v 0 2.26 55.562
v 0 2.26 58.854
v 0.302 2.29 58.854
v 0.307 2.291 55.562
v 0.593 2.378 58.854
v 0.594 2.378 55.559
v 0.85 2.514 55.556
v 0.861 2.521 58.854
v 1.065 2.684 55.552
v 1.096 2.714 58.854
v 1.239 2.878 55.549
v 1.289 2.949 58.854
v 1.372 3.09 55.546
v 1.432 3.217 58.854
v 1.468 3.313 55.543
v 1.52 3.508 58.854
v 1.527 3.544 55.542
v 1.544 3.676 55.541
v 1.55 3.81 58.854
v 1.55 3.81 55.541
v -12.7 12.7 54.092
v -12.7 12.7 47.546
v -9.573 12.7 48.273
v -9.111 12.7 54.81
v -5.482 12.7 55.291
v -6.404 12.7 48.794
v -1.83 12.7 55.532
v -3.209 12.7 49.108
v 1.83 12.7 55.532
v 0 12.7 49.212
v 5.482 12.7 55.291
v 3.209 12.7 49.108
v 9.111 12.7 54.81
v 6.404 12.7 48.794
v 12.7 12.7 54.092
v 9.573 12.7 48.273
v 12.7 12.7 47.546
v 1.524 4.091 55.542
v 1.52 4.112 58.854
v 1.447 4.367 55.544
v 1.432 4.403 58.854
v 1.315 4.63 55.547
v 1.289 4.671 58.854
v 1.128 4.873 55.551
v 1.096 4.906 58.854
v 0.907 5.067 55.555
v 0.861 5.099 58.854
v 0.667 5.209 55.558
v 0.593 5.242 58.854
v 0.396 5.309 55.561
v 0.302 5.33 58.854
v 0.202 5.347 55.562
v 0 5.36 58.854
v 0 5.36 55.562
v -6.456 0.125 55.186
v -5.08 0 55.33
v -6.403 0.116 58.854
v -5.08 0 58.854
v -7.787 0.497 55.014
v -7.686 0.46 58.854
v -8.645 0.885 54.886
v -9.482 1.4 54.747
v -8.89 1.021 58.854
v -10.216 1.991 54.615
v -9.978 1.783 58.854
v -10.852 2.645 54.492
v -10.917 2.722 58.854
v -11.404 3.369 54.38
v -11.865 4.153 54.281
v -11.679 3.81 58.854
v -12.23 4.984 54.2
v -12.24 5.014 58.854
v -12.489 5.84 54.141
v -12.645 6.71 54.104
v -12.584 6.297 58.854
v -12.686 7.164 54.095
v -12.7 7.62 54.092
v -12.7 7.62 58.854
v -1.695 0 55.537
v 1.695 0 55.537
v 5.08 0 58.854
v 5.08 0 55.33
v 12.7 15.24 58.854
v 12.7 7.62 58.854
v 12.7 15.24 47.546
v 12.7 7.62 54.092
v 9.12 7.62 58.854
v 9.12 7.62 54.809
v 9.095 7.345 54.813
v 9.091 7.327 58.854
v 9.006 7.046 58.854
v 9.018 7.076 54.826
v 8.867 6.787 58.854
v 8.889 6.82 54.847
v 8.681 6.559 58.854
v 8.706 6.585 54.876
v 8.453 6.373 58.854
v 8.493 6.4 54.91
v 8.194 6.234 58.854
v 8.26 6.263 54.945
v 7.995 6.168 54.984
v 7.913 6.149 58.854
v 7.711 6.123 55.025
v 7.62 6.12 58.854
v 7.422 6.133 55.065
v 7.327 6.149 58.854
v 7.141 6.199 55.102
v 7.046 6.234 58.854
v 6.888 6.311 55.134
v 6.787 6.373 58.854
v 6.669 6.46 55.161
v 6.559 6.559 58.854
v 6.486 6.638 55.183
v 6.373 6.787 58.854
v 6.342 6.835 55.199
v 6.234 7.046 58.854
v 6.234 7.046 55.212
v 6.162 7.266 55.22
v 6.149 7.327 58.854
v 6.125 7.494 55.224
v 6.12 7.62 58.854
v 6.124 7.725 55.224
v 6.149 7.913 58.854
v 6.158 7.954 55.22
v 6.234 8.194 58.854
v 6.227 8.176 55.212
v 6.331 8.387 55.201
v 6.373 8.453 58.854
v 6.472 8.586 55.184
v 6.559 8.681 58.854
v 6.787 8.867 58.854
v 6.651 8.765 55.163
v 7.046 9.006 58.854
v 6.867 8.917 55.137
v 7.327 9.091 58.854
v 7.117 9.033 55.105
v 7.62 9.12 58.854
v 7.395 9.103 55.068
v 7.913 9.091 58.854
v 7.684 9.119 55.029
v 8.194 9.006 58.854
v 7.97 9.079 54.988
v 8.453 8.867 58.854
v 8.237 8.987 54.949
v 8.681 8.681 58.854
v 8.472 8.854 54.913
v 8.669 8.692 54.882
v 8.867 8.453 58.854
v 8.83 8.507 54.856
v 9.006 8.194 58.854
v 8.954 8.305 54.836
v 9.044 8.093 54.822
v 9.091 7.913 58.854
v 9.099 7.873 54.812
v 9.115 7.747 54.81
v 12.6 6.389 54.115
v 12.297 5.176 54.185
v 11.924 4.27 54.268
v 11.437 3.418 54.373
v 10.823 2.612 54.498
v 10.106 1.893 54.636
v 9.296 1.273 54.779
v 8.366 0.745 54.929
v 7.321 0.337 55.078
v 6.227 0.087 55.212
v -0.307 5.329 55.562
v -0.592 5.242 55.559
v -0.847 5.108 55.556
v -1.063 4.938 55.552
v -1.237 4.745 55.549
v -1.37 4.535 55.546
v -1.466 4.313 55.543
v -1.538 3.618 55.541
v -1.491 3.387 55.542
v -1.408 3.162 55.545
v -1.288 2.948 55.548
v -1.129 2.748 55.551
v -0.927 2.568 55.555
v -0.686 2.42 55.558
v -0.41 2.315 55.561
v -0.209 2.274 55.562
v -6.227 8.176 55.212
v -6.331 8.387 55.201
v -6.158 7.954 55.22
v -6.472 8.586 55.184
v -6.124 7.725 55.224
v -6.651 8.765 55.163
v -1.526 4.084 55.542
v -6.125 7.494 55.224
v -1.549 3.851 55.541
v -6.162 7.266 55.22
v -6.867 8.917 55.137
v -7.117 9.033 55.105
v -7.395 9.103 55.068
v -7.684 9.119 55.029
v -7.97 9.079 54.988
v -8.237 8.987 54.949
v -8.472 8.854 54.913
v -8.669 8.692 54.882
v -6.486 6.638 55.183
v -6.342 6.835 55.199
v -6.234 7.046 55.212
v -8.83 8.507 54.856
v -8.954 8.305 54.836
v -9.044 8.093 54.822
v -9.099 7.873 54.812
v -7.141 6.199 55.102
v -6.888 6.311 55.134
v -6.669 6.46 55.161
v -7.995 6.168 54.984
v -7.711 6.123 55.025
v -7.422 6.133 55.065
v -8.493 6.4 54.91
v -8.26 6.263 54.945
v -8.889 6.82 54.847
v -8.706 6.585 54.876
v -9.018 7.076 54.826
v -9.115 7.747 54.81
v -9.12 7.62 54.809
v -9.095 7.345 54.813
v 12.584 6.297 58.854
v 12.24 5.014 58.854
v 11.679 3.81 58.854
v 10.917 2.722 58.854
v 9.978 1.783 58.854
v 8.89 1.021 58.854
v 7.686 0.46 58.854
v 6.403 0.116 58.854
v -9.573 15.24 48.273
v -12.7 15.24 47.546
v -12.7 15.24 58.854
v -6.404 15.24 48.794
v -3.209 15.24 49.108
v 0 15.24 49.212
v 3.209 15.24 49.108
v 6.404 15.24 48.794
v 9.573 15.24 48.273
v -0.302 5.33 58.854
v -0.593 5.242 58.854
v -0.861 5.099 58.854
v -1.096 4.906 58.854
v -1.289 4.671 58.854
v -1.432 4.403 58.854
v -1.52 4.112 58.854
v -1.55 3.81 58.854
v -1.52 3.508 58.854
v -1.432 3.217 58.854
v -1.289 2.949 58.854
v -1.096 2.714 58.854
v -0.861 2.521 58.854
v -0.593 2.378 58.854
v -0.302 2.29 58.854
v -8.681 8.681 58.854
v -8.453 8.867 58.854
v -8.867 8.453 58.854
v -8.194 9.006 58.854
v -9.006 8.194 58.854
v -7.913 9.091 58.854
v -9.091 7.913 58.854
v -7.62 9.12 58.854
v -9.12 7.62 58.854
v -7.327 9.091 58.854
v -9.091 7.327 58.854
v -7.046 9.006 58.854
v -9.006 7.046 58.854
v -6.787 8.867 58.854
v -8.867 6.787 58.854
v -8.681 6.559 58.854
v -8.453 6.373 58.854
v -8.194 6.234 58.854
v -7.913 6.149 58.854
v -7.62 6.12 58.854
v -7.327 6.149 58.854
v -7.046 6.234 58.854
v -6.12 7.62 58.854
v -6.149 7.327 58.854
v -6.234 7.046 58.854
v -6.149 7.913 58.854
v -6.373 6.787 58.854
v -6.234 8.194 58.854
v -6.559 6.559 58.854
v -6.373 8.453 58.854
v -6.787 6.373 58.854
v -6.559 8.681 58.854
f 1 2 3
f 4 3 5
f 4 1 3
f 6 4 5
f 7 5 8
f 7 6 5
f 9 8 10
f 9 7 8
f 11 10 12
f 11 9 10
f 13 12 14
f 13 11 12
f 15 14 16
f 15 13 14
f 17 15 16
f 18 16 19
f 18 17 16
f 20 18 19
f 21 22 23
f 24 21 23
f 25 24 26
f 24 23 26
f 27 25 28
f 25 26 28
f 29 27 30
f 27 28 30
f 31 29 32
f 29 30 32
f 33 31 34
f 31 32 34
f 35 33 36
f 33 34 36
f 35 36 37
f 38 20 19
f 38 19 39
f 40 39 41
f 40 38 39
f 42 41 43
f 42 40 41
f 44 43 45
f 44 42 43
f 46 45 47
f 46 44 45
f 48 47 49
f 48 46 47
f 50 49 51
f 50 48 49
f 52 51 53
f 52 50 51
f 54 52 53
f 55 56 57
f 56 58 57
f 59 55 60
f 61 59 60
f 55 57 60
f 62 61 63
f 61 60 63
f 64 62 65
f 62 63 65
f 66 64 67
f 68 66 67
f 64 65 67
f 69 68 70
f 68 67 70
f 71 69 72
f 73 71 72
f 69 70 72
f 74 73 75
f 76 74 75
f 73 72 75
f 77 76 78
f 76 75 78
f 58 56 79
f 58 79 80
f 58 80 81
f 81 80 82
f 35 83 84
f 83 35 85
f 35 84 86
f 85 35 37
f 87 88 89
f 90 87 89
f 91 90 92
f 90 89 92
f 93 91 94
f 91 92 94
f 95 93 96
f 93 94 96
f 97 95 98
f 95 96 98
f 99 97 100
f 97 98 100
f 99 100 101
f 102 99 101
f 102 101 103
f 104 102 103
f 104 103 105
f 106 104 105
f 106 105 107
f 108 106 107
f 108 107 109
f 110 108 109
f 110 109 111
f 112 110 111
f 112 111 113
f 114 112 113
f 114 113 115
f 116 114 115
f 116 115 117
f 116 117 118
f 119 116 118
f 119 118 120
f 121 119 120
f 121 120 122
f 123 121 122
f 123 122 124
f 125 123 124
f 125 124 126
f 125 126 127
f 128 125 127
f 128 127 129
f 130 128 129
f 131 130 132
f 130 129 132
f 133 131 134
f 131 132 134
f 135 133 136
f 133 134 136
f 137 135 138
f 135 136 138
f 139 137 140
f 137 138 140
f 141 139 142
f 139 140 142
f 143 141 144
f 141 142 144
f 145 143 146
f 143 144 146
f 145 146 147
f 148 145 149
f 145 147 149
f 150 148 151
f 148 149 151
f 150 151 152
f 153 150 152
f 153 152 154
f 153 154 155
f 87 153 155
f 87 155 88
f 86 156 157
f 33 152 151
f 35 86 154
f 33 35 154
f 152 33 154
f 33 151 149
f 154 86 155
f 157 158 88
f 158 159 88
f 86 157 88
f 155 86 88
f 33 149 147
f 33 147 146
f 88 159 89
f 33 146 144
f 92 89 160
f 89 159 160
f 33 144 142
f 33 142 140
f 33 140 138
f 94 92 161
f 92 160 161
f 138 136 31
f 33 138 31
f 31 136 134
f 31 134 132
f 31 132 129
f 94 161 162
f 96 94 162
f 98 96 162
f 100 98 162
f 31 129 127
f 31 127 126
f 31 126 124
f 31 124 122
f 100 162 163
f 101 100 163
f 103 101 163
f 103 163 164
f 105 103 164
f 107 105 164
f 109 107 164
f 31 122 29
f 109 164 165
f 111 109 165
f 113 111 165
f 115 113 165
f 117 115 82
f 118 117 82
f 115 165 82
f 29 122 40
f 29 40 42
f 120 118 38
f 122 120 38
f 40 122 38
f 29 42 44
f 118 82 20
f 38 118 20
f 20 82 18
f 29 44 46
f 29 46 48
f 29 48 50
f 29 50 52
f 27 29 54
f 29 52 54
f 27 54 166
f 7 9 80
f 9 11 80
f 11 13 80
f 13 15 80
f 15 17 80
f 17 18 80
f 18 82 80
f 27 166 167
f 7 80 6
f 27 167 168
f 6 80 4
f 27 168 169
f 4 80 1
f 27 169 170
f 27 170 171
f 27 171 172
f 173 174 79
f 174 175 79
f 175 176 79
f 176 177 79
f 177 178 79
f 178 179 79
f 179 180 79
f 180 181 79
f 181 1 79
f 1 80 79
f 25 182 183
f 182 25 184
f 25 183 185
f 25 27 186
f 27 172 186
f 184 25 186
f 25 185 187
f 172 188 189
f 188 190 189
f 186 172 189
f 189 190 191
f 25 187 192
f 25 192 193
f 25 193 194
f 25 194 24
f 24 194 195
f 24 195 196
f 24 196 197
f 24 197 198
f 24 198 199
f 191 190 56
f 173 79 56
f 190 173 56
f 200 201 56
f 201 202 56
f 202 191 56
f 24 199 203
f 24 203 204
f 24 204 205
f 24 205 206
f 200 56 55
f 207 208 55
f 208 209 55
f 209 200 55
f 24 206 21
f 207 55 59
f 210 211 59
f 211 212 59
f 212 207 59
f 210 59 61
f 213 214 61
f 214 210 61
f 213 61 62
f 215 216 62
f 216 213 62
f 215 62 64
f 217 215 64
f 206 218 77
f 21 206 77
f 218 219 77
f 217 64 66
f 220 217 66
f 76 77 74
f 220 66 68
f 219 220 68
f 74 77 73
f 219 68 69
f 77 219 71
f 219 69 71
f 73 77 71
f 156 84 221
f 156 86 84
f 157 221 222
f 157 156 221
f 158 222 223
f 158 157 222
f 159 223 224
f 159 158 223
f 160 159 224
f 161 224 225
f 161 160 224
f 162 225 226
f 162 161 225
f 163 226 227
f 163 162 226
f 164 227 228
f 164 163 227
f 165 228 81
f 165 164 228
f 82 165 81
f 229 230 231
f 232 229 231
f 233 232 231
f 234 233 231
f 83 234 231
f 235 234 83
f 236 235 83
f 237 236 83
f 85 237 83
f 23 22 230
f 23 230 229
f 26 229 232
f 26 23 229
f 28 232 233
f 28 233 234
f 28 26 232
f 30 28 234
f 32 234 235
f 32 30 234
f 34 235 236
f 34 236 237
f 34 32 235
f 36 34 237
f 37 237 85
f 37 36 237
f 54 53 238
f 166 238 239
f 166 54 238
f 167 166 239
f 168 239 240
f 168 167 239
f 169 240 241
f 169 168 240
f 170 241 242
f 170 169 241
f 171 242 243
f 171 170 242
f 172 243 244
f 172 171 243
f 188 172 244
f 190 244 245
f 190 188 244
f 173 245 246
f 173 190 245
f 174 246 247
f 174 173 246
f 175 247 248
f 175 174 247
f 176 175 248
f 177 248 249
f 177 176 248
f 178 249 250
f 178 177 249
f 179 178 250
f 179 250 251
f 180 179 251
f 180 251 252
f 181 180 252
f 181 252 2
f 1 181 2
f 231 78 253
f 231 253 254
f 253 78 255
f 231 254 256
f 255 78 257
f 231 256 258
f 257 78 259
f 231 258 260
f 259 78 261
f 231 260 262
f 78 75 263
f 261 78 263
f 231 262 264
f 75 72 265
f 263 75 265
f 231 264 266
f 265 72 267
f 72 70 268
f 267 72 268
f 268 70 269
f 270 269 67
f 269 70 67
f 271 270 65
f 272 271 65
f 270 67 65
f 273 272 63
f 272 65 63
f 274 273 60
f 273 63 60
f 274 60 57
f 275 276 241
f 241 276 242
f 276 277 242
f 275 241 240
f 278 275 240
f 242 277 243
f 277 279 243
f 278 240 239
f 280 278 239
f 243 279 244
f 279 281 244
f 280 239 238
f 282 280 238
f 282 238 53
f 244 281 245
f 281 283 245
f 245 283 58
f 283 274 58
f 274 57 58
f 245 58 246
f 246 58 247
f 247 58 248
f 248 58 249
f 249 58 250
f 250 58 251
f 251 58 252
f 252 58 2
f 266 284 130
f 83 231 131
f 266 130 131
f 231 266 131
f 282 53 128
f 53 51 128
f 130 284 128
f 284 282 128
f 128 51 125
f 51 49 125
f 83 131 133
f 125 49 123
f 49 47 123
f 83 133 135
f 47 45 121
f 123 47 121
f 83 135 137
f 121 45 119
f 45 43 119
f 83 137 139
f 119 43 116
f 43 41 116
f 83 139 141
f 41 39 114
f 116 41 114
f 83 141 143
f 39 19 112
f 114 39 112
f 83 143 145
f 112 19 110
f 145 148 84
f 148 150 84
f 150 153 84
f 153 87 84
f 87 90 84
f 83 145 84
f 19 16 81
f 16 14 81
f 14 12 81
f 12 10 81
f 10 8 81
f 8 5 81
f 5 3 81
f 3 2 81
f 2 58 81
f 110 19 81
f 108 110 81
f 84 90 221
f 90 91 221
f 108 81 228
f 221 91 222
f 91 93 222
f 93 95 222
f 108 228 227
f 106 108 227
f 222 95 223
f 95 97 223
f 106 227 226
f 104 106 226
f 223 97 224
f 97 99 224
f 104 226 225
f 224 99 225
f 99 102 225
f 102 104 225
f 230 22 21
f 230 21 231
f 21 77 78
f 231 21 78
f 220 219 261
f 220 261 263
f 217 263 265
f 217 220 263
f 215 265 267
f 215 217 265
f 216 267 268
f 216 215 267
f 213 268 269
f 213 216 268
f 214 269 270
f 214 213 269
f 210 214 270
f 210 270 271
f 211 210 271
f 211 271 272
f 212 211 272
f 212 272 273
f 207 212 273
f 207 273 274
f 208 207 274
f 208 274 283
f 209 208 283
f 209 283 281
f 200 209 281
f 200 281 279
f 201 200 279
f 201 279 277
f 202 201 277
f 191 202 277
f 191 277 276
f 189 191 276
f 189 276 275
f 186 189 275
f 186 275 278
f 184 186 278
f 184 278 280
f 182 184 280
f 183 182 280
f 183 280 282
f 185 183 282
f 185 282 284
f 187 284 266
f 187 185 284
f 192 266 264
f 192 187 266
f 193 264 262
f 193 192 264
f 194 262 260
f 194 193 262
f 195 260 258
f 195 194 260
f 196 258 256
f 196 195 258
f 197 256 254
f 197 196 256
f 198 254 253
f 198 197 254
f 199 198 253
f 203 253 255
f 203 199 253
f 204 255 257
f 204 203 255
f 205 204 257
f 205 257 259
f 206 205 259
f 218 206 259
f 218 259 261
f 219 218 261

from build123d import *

# Parameters (mm, degrees)
BOSS_EXTRUDE1_DEPTH = 12.7
SKETCH2_R           = 1.500000048
CUT_EXTRUDE1_DEPTH  = 58.854101994
FILLET1_R           = 7.62
CUT_EXTRUDE2_DEPTH  = 62.533611452
BOSS_EXTRUDE2_DEPTH = 2.54


with BuildPart() as part:
    # Sketch1 → Boss-Extrude1 (new body)
    with BuildSketch(Plane(origin=(0, 0, 0), x_dir=(1, 0, 0), z_dir=(0, 1, 0))):
        with BuildLine():
            ThreePointArc((12.7, -54.091601994), (0, -55.5625), (-12.7, -54.091601994))
            Line((-12.7, -54.091601994), (-12.7, -58.854101994))
            Line((-12.7, -58.854101994), (12.7, -58.854101994))
            Line((12.7, -58.854101994), (12.7, -54.091601994))
        make_face()
    extrude(amount=BOSS_EXTRUDE1_DEPTH)

    # Sketch2 → Cut-Extrude1 (cut)
    with BuildSketch(Plane.XY):
        with Locations(Location((-7.62, 7.62, 0), (0, 0, 180))):
            Circle(SKETCH2_R)
    cut_extrude1 = extrude(amount=CUT_EXTRUDE1_DEPTH, mode=Mode.SUBTRACT)

    # Mirror1: Cut-Extrude1 across plane
    add(cut_extrude1.mirror(Plane(origin=(0, 0, 0), x_dir=(0, 0, 1), z_dir=(1, 0, 0))), mode=Mode.SUBTRACT)

    # Fillet1
    fillet1_edges = [part.edges().sort_by_distance(p)[0] for p in [
        (-12.7, 0, 56.472851994),
        (12.7, 0, 56.472851994),
    ]]
    fillet(fillet1_edges, radius=FILLET1_R)

    # Sketch2<4> → Cut-Extrude2 (cut, through all)
    with BuildSketch(Plane.XY):
        with BuildLine():
            ThreePointArc((1.549999948, 3.81), (1.096015474, 4.906015474), (0, 5.359999948))
            Line((0, 5.359999948), (0, 2.260000052))
            ThreePointArc((0, 2.260000052), (1.096015474, 2.713984526), (1.549999948, 3.81))
        make_face()
        with BuildLine():
            Line((0, 2.260000052), (0, 5.359999948))
            ThreePointArc((0, 5.359999948), (-1.549999948, 3.81), (0, 2.260000052))
        make_face()
    extrude(amount=CUT_EXTRUDE2_DEPTH, mode=Mode.SUBTRACT)

    # Sketch7 → Boss-Extrude2 (add)
    with BuildSketch(Plane(origin=(0, 12.7, 0), x_dir=(1, 0, 0), z_dir=(0, 1, 0))):
        with BuildLine():
            Line((-12.7, -54.091601994), (-12.7, -58.854101994))
            Line((-12.7, -58.854101994), (12.7, -58.854101994))
            Line((12.7, -58.854101994), (12.7, -54.091601994))
            ThreePointArc((12.7, -54.091601994), (0, -55.5625), (-12.7, -54.091601994))
        make_face()
        with BuildLine():
            ThreePointArc((-12.7, -47.545558744), (0, -49.2125), (12.7, -47.545558744))
            Line((12.7, -47.545558744), (12.7, -54.091601994))
            ThreePointArc((12.7, -54.091601994), (0, -55.5625), (-12.7, -54.091601994))
            Line((-12.7, -54.091601994), (-12.7, -47.545558744))
        make_face()
    extrude(amount=BOSS_EXTRUDE2_DEPTH)


solid = part.part
